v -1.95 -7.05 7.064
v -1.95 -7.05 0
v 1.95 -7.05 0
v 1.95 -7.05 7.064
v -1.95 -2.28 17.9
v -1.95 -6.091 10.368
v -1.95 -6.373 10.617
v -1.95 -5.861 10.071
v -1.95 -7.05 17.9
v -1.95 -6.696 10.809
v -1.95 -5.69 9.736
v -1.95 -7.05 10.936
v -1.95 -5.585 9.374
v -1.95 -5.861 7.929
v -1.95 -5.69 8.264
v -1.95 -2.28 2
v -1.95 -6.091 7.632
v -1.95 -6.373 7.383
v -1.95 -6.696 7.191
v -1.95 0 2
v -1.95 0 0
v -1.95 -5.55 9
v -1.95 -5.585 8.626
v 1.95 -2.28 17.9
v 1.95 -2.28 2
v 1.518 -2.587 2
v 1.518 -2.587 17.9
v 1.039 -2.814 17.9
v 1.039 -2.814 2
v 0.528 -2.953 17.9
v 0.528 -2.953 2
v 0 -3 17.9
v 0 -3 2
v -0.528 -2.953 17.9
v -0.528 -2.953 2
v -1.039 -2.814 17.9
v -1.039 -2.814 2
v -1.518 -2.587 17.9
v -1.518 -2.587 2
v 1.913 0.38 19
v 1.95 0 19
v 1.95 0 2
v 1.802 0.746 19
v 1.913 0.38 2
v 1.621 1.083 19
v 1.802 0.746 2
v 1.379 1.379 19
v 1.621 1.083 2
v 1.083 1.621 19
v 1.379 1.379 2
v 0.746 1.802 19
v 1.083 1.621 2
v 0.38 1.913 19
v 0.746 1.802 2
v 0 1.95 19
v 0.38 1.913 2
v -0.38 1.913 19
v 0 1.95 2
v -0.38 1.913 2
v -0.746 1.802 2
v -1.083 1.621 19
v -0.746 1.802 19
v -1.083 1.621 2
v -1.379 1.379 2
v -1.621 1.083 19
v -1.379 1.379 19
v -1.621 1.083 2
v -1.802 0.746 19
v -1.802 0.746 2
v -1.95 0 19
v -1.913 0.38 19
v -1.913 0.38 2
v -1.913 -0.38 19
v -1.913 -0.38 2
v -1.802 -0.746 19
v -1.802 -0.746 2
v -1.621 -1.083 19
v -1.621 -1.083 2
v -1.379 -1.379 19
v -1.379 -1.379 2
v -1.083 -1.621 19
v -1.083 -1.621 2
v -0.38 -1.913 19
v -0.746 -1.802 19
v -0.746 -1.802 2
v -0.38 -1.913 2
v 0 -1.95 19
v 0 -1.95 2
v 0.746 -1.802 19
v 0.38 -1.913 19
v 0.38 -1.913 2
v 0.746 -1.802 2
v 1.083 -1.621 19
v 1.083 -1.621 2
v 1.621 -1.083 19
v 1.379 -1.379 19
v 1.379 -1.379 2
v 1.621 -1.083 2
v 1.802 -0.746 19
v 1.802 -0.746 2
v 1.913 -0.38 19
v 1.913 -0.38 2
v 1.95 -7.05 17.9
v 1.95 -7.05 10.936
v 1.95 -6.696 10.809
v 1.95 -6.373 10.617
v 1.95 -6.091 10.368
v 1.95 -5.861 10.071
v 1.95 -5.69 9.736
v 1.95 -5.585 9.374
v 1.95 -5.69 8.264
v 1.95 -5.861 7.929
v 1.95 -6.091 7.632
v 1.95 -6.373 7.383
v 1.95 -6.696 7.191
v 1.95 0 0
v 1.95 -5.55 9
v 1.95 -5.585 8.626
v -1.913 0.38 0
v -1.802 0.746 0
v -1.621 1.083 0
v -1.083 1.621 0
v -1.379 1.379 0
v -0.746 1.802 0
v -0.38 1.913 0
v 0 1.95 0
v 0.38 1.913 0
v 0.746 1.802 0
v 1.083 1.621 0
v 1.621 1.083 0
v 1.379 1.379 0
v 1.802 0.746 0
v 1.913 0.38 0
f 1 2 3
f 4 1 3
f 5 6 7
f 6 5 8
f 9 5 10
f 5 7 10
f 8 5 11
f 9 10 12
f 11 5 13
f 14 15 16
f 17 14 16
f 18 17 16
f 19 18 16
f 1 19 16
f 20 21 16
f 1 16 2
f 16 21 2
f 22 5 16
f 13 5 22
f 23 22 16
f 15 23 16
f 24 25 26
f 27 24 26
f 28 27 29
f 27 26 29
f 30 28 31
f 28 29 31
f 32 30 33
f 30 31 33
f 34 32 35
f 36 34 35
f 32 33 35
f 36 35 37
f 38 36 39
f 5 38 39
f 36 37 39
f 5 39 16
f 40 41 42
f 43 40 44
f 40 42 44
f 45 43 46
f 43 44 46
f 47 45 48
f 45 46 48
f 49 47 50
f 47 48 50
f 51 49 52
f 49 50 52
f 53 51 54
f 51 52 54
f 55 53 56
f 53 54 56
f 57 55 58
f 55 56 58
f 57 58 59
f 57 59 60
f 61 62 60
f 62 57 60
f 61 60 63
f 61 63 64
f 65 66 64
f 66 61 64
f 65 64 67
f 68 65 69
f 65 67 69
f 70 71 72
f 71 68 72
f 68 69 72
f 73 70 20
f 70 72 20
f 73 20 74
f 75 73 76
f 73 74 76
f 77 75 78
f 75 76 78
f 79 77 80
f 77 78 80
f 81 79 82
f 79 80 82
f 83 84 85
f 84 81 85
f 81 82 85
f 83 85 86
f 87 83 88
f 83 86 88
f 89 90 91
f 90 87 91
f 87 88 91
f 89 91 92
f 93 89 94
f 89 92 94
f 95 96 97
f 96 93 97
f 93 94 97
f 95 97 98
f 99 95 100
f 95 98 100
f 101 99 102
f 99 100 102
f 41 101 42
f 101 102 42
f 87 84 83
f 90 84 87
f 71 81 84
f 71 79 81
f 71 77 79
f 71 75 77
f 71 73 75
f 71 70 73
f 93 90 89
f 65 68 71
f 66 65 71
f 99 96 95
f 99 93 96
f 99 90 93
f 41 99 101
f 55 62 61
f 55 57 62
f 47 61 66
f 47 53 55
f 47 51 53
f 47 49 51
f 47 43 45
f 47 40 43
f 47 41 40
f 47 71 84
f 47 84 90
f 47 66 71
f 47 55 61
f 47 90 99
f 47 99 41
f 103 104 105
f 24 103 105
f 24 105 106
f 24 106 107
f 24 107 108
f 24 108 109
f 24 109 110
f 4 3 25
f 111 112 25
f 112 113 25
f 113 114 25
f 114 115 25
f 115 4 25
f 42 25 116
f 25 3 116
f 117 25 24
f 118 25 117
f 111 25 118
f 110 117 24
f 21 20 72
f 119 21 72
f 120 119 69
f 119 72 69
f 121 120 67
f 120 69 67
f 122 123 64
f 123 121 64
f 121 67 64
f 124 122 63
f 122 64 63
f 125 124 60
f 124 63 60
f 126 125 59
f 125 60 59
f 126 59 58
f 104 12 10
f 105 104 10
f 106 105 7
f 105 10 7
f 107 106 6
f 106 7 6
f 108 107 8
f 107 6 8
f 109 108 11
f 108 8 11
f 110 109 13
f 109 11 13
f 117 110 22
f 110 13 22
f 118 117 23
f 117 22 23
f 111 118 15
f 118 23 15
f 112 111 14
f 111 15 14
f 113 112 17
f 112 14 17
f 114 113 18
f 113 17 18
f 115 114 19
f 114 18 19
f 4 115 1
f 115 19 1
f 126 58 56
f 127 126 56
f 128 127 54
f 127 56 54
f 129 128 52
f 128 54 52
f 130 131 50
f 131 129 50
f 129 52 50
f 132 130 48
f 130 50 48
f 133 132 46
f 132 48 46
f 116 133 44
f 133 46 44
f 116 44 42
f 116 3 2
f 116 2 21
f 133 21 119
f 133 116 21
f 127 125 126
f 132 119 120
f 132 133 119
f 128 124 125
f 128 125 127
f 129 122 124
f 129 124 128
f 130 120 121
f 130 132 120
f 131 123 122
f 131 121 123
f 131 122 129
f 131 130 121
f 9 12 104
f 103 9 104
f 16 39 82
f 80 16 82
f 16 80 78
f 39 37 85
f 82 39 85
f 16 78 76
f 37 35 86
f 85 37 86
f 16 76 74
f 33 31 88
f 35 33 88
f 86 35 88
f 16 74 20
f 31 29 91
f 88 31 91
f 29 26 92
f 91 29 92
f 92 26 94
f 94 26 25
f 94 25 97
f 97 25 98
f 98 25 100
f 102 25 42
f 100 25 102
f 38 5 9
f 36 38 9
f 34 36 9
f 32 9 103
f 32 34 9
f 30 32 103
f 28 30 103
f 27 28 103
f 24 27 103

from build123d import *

# Parameters (mm, degrees)
SKETCH_1_R          = 1.95
EXTRUDE_1_DEPTH     = 19
SKETCH_4_W          = 2
SKETCH_4_H          = 9
EXTRUDE_2_DEPTH     = 1.95
CUT_EXTRUDE_1_DEPTH = 21.359396
EXTRUDE_4_DEPTH     = 15.9
SKETCH_9_R          = 2
CUT_EXTRUDE_2_DEPTH = 17


with BuildPart() as part:
    # 스케치1 → 보스-돌출1 (new body)
    with BuildSketch(Plane.XY):
        Circle(SKETCH_1_R)
    extrude(amount=EXTRUDE_1_DEPTH)

    # 스케치4 → 보스-돌출2 (add, symmetric)
    with BuildSketch(Plane(origin=(0, 0, 0), x_dir=(0, 0, -1), z_dir=(1, 0, 0))):
        with Locations((-1, -2.55)):
            Rectangle(SKETCH_4_W, SKETCH_4_H)
    extrude(amount=EXTRUDE_2_DEPTH, both=True)

    # 스케치5 → 컷-돌출1 (cut, through all)
    with BuildSketch(Plane.XY.offset(19)):
        with BuildLine():
            Line((-1.95, 1.95), (-1.95, 0))
            ThreePointArc((-1.95, 0), (-1.378858, 1.378858), (0, 1.95))
            Line((0, 1.95), (-1.95, 1.95))
        make_face()
        with BuildLine():
            ThreePointArc((0, 1.95), (1.378858, 1.378858), (1.95, 0))
            Line((1.95, 0), (1.95, 1.95))
            Line((1.95, 1.95), (0, 1.95))
        make_face()
    extrude(amount=-CUT_EXTRUDE_1_DEPTH, mode=Mode.SUBTRACT)

    # 스케치8 → 보스-돌출4 (add)
    with BuildSketch(Plane.XY.offset(2)):
        with BuildLine():
            ThreePointArc((1.95, -2.279803), (0, -3), (-1.95, -2.279803))
            Line((-1.95, -2.279803), (-1.95, -7.05))
            Line((-1.95, -7.05), (1.95, -7.05))
            Line((1.95, -7.05), (1.95, -2.279803))
        make_face()
    extrude(amount=EXTRUDE_4_DEPTH)

    # 스케치9 → 컷-돌출2 (cut)
    with BuildSketch(Plane.ZY.offset(1.95)):
        with Locations((9, -7.55)):
            Circle(SKETCH_9_R)
    extrude(amount=-CUT_EXTRUDE_2_DEPTH, mode=Mode.SUBTRACT)


solid = part.part
